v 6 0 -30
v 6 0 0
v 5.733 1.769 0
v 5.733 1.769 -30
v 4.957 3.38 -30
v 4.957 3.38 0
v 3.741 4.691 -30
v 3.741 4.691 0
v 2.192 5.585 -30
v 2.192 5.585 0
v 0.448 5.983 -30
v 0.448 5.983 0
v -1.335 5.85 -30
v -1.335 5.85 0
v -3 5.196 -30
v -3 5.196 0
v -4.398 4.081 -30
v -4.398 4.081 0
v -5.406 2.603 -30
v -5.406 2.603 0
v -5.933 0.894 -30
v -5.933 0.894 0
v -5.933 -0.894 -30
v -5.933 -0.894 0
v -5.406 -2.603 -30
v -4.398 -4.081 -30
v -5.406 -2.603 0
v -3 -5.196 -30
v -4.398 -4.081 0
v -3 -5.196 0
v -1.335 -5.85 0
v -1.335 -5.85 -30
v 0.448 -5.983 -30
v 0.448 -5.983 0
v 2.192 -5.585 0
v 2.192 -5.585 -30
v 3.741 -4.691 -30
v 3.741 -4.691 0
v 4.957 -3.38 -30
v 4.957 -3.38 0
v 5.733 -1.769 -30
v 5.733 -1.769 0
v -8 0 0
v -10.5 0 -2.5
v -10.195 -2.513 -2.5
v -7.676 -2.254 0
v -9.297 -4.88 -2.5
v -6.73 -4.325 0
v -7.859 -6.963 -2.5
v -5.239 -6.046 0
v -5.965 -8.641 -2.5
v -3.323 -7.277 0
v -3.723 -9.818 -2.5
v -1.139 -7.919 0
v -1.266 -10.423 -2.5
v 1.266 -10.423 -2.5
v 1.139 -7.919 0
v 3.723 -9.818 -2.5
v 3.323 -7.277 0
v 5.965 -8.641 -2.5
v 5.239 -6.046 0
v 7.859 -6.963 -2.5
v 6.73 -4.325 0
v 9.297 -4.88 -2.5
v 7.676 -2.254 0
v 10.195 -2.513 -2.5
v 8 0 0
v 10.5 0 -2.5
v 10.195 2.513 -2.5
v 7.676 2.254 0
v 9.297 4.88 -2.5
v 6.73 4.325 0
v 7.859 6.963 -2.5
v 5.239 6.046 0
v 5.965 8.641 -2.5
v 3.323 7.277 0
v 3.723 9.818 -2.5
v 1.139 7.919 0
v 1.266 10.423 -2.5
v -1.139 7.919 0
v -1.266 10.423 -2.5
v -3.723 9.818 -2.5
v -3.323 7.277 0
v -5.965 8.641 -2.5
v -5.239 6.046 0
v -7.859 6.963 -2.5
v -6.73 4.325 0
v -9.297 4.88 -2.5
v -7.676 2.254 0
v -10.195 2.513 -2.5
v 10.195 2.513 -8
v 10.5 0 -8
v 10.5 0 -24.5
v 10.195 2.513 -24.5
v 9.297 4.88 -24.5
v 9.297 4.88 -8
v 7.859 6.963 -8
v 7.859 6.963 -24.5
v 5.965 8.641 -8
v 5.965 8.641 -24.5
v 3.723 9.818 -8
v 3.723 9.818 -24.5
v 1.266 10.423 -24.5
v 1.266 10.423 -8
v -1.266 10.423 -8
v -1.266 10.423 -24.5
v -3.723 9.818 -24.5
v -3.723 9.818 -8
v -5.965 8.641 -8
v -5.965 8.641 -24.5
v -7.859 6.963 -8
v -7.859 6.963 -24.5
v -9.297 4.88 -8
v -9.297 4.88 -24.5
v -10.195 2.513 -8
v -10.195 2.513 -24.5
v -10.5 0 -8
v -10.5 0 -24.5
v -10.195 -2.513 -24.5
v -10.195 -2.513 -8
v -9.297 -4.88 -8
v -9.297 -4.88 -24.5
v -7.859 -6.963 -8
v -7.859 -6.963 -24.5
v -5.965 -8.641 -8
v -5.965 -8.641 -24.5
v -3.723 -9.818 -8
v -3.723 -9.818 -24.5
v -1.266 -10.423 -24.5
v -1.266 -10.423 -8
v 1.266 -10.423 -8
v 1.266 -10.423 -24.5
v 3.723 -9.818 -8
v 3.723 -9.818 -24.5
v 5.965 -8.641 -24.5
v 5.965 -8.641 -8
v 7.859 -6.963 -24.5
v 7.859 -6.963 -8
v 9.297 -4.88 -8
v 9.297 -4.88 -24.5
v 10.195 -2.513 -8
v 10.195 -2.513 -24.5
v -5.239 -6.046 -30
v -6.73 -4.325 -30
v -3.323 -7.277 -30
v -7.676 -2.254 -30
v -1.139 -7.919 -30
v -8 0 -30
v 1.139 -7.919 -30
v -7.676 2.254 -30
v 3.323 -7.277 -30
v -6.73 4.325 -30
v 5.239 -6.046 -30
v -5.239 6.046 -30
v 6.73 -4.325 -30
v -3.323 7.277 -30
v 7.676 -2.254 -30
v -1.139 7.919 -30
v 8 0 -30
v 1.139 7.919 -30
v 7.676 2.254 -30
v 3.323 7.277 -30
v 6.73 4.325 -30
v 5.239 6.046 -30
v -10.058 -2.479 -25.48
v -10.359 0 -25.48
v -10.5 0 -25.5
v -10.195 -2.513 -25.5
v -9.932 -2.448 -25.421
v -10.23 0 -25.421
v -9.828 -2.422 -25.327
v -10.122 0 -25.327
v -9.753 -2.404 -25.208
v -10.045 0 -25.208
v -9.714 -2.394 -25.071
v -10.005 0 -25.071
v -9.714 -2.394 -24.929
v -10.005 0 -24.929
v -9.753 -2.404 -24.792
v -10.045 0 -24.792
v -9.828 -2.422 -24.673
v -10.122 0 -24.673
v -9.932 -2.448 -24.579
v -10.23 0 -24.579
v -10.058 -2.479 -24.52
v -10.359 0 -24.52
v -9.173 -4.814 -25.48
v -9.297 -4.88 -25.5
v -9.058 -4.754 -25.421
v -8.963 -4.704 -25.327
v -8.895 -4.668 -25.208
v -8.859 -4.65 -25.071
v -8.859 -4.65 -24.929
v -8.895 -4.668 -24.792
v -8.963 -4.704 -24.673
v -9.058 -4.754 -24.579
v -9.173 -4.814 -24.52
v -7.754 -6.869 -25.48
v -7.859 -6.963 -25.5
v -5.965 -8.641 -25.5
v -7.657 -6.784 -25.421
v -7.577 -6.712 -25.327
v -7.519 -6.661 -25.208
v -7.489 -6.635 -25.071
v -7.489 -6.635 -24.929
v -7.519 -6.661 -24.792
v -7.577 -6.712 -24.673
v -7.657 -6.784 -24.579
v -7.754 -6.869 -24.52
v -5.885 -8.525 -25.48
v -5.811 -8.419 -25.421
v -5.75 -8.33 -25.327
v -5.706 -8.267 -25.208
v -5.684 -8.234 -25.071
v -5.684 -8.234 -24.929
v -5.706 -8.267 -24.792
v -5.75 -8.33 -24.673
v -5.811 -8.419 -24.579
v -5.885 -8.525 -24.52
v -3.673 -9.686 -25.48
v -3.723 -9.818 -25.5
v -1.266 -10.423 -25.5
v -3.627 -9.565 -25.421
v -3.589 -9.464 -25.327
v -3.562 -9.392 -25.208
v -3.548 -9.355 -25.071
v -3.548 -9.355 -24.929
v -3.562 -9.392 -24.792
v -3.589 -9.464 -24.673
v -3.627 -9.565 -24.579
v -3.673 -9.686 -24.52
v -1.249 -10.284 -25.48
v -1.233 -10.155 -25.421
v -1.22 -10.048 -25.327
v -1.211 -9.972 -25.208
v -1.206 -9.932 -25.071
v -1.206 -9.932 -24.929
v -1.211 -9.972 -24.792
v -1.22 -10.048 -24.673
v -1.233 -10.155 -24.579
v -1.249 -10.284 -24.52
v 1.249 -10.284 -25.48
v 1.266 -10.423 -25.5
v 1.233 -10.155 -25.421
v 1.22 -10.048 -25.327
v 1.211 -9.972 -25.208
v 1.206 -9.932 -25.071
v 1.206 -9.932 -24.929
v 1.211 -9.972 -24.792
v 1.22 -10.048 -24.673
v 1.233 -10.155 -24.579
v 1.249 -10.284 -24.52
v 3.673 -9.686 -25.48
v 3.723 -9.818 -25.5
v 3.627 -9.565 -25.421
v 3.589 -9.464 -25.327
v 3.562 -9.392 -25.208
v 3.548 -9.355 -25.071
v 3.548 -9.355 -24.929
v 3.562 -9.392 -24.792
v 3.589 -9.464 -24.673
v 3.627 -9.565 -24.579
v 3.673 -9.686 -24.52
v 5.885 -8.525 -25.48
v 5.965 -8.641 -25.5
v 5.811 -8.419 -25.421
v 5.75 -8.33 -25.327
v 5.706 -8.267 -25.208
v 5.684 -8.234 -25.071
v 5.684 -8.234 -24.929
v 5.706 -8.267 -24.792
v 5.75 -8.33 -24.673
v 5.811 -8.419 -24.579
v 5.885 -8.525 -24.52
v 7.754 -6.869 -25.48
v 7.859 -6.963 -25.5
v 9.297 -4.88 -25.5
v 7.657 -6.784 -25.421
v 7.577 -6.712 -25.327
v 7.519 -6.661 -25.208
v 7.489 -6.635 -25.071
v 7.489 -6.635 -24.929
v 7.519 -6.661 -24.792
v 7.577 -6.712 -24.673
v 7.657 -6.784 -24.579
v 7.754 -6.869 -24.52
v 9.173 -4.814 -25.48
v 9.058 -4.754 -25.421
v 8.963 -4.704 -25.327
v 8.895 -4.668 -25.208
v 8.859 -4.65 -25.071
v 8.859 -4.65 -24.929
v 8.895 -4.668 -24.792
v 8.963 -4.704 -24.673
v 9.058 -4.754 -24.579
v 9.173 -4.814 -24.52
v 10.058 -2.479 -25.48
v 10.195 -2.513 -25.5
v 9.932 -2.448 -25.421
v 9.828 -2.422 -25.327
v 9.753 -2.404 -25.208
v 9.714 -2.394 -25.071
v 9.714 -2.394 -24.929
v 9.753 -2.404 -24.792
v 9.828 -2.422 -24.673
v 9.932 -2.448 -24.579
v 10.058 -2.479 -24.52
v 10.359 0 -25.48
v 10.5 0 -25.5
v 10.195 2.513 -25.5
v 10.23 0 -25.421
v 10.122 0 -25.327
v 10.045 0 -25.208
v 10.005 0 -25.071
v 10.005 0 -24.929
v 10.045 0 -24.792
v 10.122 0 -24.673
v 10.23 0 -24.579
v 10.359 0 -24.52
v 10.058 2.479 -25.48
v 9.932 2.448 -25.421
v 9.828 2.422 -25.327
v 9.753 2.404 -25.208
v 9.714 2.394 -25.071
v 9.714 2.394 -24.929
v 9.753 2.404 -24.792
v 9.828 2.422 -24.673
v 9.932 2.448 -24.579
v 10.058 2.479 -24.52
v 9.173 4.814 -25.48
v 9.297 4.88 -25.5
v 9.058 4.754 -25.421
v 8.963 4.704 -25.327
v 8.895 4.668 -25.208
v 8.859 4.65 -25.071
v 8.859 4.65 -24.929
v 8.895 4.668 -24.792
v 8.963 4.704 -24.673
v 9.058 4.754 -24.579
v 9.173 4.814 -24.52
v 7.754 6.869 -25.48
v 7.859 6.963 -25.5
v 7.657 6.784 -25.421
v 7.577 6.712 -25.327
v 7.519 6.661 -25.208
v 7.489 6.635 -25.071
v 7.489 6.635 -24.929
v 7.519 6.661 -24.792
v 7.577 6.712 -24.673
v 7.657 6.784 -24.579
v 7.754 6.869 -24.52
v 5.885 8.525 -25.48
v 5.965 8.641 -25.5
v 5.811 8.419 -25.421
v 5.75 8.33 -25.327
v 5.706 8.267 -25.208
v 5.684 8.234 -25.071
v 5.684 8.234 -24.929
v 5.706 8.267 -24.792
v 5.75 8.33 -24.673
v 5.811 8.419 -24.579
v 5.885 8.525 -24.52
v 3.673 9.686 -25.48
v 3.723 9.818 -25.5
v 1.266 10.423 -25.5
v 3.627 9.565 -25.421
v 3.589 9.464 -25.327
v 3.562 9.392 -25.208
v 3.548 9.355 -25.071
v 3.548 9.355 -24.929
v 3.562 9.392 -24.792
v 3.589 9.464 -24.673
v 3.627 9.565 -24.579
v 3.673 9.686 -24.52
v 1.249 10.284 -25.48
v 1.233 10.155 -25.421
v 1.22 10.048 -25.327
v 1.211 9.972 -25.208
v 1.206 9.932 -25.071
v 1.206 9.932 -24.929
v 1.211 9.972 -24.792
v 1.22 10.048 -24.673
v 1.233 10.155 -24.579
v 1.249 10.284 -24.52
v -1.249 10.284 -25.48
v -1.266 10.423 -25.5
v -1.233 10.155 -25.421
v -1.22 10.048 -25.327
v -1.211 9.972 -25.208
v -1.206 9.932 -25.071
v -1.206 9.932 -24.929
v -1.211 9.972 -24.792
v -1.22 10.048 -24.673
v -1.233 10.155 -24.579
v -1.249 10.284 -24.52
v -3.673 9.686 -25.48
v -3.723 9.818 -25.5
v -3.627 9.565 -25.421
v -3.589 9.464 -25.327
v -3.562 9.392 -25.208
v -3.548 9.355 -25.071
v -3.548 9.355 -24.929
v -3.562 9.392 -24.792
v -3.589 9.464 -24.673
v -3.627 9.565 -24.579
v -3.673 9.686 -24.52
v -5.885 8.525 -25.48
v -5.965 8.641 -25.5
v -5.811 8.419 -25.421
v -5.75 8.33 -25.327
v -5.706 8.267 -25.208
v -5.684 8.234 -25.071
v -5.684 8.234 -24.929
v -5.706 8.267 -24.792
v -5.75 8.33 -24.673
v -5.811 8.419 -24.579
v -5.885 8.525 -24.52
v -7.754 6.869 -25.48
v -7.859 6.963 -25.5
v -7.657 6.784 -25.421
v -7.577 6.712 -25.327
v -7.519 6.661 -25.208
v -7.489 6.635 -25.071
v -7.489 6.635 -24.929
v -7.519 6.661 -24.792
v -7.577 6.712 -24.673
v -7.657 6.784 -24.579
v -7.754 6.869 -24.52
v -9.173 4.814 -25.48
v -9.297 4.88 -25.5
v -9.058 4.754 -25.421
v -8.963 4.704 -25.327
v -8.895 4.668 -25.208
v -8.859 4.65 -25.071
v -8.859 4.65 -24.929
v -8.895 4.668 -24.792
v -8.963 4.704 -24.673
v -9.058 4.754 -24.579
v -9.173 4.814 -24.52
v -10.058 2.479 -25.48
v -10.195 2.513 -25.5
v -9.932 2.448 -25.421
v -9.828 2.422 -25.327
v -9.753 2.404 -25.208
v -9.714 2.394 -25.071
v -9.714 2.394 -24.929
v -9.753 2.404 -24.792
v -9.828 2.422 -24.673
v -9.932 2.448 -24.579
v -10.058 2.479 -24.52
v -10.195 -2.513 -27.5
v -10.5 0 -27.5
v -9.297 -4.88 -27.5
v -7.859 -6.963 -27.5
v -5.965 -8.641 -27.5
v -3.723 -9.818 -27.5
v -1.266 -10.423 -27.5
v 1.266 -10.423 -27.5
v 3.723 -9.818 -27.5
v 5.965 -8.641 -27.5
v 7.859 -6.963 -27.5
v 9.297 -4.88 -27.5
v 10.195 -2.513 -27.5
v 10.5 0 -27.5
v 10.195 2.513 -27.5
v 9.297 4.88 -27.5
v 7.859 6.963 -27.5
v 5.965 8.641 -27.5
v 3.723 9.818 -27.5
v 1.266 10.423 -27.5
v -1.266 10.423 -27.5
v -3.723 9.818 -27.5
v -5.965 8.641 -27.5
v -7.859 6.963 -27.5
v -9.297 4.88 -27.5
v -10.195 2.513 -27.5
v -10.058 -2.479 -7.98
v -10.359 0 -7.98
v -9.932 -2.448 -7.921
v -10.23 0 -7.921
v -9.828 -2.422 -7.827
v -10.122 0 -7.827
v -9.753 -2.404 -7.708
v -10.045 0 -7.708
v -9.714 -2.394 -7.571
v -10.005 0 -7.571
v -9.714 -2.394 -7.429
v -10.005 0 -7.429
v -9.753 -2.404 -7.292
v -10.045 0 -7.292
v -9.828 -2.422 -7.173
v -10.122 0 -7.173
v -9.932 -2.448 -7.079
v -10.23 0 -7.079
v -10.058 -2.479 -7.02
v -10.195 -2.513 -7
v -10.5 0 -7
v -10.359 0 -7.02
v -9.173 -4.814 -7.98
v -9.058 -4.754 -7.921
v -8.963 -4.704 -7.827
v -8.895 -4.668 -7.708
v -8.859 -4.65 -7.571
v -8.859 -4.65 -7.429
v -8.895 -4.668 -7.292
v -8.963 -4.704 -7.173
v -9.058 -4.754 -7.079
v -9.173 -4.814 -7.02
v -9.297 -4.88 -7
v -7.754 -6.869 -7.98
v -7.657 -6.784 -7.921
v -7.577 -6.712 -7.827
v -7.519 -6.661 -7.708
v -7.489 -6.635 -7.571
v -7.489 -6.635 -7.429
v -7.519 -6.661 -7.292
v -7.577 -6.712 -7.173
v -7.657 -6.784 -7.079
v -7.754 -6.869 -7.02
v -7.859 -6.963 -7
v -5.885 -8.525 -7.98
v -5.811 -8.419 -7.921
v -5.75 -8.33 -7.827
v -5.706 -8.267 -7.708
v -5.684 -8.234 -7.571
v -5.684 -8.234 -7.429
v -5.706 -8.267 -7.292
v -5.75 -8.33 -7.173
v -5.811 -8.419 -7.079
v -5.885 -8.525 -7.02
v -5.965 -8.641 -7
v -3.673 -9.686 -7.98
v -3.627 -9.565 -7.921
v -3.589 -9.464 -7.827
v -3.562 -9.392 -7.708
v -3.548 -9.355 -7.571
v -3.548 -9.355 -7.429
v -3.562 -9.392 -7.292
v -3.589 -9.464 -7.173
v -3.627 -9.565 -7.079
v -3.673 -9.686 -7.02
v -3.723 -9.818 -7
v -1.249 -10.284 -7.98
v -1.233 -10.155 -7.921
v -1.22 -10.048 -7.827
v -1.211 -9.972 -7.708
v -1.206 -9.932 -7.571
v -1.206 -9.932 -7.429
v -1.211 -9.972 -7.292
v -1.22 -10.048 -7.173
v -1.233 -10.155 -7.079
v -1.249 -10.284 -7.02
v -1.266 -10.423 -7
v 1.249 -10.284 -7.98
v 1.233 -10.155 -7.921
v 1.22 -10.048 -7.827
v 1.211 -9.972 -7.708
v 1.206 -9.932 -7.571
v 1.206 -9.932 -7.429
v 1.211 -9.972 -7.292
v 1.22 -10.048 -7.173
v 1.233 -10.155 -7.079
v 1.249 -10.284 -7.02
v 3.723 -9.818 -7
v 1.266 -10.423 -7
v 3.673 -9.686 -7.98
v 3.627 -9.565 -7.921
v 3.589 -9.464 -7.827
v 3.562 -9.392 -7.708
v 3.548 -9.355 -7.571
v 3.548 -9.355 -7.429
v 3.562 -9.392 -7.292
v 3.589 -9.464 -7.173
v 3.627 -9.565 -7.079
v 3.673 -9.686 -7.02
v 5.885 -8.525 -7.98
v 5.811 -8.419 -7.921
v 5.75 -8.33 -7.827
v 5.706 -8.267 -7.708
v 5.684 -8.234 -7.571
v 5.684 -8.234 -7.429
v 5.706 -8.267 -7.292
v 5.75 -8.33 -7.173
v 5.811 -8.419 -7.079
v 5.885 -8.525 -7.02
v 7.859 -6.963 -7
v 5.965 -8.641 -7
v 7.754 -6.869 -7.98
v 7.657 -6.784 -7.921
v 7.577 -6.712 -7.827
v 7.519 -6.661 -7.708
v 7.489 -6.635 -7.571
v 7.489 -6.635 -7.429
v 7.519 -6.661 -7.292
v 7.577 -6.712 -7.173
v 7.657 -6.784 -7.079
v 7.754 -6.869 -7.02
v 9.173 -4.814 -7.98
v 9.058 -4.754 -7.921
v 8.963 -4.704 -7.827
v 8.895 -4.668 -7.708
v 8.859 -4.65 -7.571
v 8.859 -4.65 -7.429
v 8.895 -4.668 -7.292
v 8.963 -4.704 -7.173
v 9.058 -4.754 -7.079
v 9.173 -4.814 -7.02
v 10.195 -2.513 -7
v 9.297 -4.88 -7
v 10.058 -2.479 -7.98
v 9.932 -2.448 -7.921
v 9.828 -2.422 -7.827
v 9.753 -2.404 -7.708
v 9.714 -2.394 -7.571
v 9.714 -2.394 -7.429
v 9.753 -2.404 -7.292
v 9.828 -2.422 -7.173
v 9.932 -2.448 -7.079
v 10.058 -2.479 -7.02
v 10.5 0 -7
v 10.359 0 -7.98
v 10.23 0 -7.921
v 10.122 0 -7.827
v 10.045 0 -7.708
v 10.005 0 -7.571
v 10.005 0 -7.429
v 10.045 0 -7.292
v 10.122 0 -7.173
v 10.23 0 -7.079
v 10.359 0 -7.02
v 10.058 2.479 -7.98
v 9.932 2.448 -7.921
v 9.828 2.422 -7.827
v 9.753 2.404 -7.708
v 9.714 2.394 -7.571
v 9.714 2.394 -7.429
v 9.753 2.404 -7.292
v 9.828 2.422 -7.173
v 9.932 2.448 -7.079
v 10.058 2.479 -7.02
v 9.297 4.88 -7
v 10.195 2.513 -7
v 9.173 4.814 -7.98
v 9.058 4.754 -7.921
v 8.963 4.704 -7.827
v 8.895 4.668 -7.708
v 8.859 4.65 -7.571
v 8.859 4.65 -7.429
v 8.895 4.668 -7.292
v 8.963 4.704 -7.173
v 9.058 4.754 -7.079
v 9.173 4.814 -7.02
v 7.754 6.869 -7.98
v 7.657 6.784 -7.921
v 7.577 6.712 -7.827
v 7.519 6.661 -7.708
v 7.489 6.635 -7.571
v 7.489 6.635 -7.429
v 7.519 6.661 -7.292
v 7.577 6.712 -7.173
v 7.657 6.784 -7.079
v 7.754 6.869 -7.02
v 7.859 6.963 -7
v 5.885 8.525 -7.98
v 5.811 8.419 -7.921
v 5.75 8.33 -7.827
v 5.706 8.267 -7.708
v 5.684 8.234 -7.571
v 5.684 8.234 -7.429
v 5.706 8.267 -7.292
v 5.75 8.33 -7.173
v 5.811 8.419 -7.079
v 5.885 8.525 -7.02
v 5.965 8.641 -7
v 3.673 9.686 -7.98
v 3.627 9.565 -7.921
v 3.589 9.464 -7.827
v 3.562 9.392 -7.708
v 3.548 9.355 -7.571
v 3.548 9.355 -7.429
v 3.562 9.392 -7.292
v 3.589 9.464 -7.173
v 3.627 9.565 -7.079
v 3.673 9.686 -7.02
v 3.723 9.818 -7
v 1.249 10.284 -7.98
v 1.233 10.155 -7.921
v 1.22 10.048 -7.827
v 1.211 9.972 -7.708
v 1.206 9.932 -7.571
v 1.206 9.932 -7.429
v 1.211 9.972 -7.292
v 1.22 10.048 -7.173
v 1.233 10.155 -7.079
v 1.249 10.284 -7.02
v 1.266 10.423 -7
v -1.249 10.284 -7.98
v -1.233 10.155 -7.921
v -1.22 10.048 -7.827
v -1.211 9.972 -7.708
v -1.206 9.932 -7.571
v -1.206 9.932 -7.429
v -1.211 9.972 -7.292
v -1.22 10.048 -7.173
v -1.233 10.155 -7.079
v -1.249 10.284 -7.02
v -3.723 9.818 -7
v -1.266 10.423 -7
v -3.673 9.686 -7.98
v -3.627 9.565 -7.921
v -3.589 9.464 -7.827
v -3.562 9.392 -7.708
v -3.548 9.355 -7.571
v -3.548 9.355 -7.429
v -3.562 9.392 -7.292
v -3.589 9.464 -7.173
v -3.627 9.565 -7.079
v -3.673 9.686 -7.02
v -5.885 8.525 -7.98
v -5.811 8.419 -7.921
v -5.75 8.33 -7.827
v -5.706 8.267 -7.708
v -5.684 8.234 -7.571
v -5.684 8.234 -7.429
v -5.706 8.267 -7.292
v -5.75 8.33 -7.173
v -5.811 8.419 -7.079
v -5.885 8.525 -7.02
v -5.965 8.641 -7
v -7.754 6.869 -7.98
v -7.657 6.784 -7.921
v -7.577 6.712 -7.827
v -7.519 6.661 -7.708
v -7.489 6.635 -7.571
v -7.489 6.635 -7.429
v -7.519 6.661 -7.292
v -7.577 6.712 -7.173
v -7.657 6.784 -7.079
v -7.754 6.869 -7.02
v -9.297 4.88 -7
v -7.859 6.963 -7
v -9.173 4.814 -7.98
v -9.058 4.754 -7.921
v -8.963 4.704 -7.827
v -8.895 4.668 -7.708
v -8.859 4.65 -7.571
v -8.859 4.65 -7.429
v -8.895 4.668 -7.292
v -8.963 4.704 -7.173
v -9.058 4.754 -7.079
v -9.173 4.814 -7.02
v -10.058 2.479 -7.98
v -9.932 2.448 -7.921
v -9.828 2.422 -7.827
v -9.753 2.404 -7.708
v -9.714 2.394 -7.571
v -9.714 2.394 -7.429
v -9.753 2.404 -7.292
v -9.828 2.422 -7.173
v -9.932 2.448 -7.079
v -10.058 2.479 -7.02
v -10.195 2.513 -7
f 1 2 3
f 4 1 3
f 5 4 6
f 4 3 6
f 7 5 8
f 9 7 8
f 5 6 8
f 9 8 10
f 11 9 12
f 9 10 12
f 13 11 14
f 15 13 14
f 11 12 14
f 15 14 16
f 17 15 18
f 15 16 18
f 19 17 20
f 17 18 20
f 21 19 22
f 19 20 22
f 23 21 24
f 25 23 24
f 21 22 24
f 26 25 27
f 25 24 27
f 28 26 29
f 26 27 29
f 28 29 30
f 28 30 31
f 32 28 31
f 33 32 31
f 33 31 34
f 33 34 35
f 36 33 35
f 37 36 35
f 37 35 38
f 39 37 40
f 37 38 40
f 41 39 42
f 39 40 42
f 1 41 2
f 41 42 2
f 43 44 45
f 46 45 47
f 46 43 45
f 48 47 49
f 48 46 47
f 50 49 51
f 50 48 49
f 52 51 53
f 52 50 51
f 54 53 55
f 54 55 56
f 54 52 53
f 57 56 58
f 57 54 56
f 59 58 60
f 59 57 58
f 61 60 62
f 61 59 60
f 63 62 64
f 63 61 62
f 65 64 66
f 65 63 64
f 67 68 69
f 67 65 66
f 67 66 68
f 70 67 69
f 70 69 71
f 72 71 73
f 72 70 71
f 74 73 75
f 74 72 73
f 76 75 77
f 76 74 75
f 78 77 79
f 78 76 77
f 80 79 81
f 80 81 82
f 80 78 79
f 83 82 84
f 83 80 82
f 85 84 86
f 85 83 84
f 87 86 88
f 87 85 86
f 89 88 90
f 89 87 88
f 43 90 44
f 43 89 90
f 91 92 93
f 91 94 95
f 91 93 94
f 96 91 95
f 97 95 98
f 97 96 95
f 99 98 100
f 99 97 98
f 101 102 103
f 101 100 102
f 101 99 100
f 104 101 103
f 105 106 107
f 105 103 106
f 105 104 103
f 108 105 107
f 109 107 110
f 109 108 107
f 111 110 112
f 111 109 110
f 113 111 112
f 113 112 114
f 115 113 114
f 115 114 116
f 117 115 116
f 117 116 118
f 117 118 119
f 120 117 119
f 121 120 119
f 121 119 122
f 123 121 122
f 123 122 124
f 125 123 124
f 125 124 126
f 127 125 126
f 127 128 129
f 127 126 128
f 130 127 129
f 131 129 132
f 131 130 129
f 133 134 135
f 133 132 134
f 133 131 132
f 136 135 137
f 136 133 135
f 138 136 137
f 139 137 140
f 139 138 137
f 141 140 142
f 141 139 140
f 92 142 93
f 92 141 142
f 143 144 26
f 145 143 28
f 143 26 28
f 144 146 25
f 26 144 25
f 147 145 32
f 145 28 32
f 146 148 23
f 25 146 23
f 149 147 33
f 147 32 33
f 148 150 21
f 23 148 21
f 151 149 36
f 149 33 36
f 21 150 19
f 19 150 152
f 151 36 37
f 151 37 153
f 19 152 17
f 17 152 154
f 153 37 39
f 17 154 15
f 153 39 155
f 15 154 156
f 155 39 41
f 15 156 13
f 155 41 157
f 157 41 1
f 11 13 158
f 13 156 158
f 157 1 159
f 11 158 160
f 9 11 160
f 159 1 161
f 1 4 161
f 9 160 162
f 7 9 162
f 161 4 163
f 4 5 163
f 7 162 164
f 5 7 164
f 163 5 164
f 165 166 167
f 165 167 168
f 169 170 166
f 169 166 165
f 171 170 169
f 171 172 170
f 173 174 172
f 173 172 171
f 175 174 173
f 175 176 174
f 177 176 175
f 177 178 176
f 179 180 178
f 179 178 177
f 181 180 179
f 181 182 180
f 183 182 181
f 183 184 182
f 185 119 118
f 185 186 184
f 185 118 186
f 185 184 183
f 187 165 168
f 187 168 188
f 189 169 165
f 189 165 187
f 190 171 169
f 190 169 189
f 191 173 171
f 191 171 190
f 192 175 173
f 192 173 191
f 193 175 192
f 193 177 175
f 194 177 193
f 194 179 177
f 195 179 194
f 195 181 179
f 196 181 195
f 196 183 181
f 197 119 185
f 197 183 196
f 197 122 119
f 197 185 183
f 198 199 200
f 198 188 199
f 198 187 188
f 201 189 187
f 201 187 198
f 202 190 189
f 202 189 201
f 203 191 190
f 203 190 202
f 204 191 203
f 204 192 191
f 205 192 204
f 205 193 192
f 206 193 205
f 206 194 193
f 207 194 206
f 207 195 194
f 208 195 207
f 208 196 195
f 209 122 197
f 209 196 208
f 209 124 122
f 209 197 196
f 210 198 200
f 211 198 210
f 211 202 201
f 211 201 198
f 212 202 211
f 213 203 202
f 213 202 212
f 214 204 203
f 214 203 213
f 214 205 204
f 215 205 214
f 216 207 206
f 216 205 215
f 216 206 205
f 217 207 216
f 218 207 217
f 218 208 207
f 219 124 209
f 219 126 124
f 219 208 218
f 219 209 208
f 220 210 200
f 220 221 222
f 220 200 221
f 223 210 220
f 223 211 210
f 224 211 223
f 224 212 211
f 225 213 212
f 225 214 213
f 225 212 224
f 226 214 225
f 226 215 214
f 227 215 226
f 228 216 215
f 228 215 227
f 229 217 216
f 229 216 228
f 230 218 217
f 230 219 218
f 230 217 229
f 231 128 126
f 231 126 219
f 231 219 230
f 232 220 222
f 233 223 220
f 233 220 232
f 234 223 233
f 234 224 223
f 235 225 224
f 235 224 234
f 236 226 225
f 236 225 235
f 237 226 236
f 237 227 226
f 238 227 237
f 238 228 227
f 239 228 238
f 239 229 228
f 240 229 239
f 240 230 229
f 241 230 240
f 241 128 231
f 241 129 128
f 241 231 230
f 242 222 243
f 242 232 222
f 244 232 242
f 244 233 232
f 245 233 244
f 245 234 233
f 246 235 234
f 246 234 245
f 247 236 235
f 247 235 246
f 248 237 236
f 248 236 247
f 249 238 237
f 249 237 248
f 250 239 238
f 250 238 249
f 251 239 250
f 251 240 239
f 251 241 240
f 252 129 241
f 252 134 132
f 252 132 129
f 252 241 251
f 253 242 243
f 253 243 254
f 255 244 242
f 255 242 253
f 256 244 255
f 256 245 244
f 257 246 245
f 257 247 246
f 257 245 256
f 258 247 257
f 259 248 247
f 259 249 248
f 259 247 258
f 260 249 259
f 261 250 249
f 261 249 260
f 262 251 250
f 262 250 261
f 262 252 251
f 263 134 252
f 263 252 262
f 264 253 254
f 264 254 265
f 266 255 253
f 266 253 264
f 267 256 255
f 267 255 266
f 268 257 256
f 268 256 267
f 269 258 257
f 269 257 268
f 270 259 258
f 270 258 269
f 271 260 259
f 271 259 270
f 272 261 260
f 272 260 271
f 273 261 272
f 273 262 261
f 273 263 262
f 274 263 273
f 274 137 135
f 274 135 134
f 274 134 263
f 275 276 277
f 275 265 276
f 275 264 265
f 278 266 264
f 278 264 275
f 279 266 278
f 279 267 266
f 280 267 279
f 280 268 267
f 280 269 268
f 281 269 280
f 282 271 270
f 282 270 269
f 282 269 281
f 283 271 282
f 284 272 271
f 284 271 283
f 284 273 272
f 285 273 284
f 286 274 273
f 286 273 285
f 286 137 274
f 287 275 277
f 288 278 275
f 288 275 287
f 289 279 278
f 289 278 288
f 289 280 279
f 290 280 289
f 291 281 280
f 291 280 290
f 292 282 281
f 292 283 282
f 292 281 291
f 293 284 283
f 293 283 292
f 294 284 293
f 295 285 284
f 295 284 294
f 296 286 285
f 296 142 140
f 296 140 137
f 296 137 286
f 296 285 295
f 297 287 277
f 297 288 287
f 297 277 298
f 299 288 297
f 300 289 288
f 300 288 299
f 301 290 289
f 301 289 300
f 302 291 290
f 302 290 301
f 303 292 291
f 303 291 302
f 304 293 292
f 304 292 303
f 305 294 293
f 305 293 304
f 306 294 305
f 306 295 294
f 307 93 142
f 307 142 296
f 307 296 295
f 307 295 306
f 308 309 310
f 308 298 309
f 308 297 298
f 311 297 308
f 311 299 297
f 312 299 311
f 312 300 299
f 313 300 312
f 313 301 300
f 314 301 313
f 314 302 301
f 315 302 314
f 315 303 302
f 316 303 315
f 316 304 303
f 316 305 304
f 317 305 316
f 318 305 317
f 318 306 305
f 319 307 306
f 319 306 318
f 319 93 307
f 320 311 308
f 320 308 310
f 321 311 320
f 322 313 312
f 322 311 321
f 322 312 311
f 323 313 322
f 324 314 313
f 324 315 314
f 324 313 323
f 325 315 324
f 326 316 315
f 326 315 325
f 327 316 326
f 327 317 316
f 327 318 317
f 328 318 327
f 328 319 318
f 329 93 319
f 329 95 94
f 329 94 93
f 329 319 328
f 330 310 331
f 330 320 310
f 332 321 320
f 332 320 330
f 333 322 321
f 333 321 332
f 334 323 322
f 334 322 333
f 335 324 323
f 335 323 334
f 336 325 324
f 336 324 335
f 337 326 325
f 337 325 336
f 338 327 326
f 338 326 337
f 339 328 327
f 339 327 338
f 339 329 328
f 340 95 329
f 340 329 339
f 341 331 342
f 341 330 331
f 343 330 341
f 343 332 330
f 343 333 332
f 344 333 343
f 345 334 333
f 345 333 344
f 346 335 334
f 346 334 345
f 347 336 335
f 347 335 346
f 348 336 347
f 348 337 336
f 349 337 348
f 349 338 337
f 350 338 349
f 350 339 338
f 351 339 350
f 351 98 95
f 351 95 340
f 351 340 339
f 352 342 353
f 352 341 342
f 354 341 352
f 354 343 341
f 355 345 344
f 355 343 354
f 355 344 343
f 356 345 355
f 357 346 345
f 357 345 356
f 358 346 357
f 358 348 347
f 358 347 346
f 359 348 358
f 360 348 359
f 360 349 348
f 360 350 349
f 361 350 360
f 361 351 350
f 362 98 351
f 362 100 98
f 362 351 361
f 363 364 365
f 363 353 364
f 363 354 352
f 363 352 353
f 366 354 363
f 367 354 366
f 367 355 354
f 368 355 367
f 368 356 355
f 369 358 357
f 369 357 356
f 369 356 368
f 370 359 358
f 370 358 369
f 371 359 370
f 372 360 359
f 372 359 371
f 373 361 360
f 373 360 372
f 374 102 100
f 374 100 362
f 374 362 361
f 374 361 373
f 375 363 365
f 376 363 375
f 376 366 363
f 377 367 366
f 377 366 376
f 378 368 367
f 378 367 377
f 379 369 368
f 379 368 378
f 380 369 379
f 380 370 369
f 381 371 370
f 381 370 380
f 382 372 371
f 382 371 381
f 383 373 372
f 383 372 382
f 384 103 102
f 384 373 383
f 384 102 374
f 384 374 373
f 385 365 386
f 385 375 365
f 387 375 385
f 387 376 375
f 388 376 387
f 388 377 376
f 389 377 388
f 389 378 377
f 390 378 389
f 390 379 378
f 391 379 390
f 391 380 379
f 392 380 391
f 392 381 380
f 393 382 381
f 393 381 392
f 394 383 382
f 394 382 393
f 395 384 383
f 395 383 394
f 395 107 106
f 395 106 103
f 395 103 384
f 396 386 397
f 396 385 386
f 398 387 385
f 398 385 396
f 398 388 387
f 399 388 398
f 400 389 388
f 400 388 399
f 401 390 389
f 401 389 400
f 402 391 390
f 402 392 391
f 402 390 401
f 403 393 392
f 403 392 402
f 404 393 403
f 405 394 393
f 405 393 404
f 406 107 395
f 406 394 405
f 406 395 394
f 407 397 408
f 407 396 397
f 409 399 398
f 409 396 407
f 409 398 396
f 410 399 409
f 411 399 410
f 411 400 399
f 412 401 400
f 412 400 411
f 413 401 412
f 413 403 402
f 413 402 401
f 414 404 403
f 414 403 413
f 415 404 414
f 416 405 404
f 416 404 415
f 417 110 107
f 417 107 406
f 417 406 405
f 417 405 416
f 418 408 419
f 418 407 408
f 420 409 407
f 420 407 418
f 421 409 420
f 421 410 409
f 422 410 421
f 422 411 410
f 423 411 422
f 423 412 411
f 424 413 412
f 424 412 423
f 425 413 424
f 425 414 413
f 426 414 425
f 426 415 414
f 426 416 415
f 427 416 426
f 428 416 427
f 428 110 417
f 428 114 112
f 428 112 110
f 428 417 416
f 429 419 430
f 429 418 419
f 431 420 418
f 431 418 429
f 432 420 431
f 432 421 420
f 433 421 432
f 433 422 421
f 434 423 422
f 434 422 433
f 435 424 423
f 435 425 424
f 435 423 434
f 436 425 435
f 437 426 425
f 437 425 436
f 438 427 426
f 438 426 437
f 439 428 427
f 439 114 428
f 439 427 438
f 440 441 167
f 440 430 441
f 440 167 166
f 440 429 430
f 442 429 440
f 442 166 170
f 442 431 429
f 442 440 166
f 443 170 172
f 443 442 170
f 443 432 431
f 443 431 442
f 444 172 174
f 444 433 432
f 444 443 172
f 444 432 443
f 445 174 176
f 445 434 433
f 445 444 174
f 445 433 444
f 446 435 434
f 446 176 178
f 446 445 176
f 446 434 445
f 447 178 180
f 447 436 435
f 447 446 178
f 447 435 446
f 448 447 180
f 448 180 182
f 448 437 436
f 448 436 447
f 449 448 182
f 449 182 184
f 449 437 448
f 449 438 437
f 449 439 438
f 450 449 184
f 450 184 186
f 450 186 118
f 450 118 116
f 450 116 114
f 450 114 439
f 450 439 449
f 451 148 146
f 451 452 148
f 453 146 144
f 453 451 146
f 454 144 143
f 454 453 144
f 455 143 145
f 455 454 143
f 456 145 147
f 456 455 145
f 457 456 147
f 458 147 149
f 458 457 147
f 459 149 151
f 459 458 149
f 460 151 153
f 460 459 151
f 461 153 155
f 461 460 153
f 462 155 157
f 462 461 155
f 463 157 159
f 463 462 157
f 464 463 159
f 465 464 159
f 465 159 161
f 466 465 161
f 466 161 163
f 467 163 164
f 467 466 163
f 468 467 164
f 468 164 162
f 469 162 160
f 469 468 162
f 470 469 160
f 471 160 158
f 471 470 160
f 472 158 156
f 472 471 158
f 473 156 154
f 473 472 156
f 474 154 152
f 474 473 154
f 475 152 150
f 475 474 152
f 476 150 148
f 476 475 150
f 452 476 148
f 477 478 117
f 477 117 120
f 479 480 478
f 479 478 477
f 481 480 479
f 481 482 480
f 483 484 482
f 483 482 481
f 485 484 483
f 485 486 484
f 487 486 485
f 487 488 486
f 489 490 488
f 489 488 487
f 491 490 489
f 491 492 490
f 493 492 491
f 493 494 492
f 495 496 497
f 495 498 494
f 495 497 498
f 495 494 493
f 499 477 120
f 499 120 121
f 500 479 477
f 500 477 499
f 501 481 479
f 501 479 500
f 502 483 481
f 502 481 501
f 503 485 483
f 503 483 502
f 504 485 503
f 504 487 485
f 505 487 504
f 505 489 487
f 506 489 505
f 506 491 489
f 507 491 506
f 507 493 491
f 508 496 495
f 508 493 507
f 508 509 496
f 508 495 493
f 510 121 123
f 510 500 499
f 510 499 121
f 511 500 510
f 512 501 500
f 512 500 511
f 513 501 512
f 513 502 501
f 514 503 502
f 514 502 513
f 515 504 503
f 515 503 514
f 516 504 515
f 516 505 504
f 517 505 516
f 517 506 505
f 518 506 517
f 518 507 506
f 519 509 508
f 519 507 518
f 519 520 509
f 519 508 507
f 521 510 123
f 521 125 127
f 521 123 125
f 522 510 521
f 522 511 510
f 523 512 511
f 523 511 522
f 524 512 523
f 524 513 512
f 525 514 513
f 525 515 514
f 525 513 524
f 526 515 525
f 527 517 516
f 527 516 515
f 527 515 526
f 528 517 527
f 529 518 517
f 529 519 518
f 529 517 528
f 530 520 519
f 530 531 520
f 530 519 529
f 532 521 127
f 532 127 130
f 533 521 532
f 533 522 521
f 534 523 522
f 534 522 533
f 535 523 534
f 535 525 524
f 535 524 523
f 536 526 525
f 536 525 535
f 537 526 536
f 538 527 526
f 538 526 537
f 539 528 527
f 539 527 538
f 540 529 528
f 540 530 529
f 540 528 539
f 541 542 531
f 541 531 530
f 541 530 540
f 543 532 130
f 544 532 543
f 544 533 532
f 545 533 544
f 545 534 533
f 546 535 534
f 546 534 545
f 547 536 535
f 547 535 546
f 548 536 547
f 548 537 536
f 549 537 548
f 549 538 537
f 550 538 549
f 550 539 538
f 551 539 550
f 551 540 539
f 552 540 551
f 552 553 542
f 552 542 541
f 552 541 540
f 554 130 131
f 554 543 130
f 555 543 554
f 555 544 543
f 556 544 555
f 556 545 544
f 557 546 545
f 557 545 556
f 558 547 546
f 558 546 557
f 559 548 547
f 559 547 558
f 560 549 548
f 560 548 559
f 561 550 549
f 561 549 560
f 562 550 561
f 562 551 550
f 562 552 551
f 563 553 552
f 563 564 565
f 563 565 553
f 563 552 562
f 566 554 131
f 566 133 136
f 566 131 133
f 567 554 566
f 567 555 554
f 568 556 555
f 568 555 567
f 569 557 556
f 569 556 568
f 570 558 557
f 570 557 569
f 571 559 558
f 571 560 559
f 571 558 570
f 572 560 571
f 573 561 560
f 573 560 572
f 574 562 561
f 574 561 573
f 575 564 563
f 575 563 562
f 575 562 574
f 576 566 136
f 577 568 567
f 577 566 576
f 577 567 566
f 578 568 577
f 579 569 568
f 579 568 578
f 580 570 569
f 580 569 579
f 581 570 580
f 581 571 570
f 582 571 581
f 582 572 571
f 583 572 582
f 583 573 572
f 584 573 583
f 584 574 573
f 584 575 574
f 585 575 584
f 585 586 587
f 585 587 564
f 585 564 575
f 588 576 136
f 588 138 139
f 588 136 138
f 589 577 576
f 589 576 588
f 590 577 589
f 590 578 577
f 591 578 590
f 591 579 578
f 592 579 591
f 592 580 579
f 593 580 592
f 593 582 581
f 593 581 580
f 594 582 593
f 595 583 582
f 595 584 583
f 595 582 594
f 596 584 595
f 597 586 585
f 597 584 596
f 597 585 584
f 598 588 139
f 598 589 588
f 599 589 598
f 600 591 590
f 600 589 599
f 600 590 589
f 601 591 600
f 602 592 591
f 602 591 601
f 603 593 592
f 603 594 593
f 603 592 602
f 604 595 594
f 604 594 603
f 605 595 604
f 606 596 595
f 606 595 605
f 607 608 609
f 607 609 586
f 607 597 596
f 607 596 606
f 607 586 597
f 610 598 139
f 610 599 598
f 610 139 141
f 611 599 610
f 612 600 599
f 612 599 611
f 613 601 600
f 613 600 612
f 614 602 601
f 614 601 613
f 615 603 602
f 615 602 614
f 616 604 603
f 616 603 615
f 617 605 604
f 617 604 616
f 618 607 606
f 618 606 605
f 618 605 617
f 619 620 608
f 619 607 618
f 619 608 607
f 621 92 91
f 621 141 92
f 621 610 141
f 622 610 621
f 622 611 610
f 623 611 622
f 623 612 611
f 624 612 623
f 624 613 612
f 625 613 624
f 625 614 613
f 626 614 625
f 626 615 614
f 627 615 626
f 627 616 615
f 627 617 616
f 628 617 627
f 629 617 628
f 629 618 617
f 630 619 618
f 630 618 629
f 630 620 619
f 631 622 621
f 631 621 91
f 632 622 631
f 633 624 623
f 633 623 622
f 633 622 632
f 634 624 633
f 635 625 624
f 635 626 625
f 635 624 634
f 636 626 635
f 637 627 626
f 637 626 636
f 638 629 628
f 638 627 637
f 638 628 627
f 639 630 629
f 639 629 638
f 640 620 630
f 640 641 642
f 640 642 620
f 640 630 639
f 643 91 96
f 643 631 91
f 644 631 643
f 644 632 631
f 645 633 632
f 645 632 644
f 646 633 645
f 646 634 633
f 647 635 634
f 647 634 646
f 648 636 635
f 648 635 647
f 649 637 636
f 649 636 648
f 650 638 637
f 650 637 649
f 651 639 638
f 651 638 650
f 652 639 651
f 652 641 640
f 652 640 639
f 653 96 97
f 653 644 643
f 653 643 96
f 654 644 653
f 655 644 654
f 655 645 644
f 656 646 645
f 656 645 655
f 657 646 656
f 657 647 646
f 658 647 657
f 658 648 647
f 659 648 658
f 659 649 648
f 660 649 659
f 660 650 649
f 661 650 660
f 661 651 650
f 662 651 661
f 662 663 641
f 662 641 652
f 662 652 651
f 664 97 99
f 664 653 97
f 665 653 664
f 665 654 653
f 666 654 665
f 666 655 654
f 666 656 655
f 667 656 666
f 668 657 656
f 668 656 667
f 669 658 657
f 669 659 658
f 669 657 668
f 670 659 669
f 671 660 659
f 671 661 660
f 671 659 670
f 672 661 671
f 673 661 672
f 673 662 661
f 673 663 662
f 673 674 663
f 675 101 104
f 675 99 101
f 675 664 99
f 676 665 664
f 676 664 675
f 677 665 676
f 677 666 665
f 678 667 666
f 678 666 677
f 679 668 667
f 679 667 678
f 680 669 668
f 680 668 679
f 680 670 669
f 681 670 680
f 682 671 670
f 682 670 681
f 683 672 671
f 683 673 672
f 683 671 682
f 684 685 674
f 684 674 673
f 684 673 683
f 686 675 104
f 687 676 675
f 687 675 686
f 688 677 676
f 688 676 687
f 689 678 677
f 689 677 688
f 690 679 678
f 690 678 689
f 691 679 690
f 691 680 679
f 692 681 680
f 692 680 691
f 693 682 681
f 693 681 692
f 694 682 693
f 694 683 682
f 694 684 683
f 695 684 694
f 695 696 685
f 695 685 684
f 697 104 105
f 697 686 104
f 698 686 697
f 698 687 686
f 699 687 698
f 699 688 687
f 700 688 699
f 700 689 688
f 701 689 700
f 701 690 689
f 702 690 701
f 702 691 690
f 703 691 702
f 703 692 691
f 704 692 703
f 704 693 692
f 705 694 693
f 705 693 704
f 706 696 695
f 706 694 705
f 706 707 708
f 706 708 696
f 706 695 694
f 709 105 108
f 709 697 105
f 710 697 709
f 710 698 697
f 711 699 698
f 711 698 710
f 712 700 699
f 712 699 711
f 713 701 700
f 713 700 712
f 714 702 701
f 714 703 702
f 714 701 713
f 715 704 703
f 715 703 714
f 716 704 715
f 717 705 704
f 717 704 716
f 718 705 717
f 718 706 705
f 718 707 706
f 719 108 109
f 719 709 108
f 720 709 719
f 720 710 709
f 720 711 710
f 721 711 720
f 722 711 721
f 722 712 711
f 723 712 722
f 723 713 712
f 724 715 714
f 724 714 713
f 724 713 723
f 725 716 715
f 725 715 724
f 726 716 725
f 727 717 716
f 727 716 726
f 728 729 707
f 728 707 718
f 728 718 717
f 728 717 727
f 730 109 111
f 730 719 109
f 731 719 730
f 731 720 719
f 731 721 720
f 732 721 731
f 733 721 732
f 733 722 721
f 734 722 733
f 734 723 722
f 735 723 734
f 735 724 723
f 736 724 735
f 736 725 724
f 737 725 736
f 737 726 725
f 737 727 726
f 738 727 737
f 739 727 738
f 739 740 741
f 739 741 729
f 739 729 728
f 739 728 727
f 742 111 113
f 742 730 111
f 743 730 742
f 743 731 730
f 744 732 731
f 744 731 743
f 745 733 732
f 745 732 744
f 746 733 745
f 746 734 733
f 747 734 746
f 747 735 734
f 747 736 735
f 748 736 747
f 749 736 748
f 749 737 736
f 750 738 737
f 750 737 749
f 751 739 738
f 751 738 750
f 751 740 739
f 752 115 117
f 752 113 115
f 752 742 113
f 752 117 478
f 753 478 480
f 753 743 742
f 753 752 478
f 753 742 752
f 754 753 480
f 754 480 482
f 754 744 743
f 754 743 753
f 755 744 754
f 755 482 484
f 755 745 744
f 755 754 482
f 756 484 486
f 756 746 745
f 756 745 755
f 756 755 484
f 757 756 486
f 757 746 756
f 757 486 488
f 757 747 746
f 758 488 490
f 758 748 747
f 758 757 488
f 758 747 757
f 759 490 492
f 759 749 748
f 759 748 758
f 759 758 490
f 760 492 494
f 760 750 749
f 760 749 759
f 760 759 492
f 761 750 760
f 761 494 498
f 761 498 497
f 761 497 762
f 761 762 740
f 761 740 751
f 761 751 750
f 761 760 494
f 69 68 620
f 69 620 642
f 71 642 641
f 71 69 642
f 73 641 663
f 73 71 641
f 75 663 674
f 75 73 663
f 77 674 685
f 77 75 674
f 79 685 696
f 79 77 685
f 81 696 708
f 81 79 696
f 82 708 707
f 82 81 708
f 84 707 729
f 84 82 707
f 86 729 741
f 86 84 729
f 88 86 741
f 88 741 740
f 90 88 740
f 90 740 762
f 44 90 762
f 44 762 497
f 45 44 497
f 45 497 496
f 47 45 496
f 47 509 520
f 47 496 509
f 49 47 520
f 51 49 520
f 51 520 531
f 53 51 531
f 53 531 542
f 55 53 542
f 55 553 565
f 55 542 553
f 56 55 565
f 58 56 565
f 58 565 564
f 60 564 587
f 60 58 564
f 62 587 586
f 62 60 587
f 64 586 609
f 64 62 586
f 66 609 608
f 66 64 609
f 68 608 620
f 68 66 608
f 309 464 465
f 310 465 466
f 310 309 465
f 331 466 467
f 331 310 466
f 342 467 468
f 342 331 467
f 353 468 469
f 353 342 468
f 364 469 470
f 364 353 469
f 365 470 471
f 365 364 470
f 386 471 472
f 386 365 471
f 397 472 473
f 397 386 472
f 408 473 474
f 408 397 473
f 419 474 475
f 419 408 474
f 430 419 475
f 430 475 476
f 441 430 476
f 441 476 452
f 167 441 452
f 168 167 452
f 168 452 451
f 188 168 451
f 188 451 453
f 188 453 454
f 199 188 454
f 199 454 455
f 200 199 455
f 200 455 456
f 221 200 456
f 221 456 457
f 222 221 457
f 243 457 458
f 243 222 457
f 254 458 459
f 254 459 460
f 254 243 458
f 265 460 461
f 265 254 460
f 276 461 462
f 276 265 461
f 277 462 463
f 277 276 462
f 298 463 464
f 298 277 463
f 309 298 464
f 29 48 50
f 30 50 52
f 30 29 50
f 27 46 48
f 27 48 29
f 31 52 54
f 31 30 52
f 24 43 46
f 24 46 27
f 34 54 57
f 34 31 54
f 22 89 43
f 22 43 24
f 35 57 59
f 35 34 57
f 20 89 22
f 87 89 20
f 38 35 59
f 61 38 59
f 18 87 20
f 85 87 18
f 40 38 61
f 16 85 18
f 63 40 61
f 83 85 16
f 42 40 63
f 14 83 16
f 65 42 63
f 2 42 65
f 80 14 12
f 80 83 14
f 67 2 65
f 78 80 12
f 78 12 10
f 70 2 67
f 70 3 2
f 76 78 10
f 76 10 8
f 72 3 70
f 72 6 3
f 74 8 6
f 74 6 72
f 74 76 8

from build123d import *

# Parameters (mm, degrees)
SKETCH_1_R      = 10.5
SKETCH_1_R_2    = 6
EXTRUDE_1_DEPTH = 30
SKETCH_4_R      = 0.5


with BuildPart() as part:
    # 草图1 → 凸台-拉伸1 (new body)
    with BuildSketch(Plane.XY):
        Circle(SKETCH_1_R)
        Circle(SKETCH_1_R_2, mode=Mode.SUBTRACT)
    extrude(amount=-EXTRUDE_1_DEPTH)

    # 草图2 → 切除-旋转3 (revolve, cut)
    with BuildSketch(Plane(origin=(0, 0, 0), x_dir=(1, 0, 0), z_dir=(0, 1, 0)), mode=Mode.PRIVATE) as cut_revolve_3_sk:
        Polygon((7.5, 30.5), (11, 27), (11, 30.5), align=None)
        Polygon((11, 3), (7.5, -0.5), (11, -0.5), align=None)
    revolve(cut_revolve_3_sk.sketch.rotate(Axis((0, 0, -40.551392487), (0, 0, 1)), 180), axis=Axis((0, 0, -40.551392487), (0, 0, 1)), mode=Mode.SUBTRACT)

    # 草图4 → 切除-旋转4 (revolve, cut)
    with BuildSketch(Plane(origin=(0, 0, 0), x_dir=(1, 0, 0), z_dir=(0, 1, 0)), mode=Mode.PRIVATE) as cut_revolve_4_sk:
        with Locations((10.5, 25)):
            Circle(SKETCH_4_R)
        with Locations((10.5, 7.5)):
            Circle(SKETCH_4_R)
    revolve(cut_revolve_4_sk.sketch.rotate(Axis((0, 0, -36.832356515), (0, 0, 1)), 180), axis=Axis((0, 0, -36.832356515), (0, 0, 1)), mode=Mode.SUBTRACT)


solid = part.part
